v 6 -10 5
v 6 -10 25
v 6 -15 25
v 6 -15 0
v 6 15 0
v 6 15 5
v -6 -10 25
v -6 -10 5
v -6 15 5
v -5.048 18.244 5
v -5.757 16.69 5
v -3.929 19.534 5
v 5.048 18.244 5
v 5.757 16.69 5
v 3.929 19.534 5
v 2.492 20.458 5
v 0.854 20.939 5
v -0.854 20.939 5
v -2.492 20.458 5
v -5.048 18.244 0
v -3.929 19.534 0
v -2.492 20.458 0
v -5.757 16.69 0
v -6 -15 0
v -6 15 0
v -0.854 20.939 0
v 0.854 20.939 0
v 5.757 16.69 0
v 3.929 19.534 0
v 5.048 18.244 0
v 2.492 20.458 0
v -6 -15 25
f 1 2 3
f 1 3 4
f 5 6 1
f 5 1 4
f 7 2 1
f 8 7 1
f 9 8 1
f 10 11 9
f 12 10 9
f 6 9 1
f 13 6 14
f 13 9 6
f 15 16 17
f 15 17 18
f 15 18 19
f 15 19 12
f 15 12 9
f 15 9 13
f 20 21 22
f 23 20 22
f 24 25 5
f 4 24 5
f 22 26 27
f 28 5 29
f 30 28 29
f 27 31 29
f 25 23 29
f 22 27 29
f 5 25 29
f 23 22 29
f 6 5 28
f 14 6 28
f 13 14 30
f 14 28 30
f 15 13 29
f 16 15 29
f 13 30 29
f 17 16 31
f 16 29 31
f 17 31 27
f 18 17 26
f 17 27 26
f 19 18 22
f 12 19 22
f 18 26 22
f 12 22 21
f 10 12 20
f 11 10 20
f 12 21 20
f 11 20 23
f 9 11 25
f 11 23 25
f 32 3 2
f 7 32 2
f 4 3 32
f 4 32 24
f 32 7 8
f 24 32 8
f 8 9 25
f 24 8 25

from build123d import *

# Parameters (mm, degrees)
BOSS_EXTRUDE1_DEPTH = 5
SKETCH2_W           = 20
SKETCH2_H           = 5
BOSS_EXTRUDE2_DEPTH = 12


with BuildPart() as part:
    # Sketch1 → Boss-Extrude1 (new body)
    with BuildSketch(Plane.XY):
        with BuildLine():
            ThreePointArc((6, 15), (0, 21), (-6, 15))
            Line((-6, 15), (6, 15))
        make_face()
        with BuildLine():
            Line((6, 15), (-6, 15))
            ThreePointArc((-6, 15), (0, 9), (6, 15))
        make_face()
        with BuildLine():
            ThreePointArc((6, 15), (0, 9), (-6, 15))
            Line((-6, 15), (-6, -15))
            Line((-6, -15), (6, -15))
            Line((6, -15), (6, 15))
        make_face()
    extrude(amount=BOSS_EXTRUDE1_DEPTH)

    # Sketch2 → Boss-Extrude2 (add)
    with BuildSketch(Plane(origin=(6, 0, 0), x_dir=(0, 0, -1), z_dir=(1, 0, 0))):
        with Locations((-15, -12.5)):
            Rectangle(SKETCH2_W, SKETCH2_H)
    extrude(amount=-BOSS_EXTRUDE2_DEPTH)


solid = part.part
